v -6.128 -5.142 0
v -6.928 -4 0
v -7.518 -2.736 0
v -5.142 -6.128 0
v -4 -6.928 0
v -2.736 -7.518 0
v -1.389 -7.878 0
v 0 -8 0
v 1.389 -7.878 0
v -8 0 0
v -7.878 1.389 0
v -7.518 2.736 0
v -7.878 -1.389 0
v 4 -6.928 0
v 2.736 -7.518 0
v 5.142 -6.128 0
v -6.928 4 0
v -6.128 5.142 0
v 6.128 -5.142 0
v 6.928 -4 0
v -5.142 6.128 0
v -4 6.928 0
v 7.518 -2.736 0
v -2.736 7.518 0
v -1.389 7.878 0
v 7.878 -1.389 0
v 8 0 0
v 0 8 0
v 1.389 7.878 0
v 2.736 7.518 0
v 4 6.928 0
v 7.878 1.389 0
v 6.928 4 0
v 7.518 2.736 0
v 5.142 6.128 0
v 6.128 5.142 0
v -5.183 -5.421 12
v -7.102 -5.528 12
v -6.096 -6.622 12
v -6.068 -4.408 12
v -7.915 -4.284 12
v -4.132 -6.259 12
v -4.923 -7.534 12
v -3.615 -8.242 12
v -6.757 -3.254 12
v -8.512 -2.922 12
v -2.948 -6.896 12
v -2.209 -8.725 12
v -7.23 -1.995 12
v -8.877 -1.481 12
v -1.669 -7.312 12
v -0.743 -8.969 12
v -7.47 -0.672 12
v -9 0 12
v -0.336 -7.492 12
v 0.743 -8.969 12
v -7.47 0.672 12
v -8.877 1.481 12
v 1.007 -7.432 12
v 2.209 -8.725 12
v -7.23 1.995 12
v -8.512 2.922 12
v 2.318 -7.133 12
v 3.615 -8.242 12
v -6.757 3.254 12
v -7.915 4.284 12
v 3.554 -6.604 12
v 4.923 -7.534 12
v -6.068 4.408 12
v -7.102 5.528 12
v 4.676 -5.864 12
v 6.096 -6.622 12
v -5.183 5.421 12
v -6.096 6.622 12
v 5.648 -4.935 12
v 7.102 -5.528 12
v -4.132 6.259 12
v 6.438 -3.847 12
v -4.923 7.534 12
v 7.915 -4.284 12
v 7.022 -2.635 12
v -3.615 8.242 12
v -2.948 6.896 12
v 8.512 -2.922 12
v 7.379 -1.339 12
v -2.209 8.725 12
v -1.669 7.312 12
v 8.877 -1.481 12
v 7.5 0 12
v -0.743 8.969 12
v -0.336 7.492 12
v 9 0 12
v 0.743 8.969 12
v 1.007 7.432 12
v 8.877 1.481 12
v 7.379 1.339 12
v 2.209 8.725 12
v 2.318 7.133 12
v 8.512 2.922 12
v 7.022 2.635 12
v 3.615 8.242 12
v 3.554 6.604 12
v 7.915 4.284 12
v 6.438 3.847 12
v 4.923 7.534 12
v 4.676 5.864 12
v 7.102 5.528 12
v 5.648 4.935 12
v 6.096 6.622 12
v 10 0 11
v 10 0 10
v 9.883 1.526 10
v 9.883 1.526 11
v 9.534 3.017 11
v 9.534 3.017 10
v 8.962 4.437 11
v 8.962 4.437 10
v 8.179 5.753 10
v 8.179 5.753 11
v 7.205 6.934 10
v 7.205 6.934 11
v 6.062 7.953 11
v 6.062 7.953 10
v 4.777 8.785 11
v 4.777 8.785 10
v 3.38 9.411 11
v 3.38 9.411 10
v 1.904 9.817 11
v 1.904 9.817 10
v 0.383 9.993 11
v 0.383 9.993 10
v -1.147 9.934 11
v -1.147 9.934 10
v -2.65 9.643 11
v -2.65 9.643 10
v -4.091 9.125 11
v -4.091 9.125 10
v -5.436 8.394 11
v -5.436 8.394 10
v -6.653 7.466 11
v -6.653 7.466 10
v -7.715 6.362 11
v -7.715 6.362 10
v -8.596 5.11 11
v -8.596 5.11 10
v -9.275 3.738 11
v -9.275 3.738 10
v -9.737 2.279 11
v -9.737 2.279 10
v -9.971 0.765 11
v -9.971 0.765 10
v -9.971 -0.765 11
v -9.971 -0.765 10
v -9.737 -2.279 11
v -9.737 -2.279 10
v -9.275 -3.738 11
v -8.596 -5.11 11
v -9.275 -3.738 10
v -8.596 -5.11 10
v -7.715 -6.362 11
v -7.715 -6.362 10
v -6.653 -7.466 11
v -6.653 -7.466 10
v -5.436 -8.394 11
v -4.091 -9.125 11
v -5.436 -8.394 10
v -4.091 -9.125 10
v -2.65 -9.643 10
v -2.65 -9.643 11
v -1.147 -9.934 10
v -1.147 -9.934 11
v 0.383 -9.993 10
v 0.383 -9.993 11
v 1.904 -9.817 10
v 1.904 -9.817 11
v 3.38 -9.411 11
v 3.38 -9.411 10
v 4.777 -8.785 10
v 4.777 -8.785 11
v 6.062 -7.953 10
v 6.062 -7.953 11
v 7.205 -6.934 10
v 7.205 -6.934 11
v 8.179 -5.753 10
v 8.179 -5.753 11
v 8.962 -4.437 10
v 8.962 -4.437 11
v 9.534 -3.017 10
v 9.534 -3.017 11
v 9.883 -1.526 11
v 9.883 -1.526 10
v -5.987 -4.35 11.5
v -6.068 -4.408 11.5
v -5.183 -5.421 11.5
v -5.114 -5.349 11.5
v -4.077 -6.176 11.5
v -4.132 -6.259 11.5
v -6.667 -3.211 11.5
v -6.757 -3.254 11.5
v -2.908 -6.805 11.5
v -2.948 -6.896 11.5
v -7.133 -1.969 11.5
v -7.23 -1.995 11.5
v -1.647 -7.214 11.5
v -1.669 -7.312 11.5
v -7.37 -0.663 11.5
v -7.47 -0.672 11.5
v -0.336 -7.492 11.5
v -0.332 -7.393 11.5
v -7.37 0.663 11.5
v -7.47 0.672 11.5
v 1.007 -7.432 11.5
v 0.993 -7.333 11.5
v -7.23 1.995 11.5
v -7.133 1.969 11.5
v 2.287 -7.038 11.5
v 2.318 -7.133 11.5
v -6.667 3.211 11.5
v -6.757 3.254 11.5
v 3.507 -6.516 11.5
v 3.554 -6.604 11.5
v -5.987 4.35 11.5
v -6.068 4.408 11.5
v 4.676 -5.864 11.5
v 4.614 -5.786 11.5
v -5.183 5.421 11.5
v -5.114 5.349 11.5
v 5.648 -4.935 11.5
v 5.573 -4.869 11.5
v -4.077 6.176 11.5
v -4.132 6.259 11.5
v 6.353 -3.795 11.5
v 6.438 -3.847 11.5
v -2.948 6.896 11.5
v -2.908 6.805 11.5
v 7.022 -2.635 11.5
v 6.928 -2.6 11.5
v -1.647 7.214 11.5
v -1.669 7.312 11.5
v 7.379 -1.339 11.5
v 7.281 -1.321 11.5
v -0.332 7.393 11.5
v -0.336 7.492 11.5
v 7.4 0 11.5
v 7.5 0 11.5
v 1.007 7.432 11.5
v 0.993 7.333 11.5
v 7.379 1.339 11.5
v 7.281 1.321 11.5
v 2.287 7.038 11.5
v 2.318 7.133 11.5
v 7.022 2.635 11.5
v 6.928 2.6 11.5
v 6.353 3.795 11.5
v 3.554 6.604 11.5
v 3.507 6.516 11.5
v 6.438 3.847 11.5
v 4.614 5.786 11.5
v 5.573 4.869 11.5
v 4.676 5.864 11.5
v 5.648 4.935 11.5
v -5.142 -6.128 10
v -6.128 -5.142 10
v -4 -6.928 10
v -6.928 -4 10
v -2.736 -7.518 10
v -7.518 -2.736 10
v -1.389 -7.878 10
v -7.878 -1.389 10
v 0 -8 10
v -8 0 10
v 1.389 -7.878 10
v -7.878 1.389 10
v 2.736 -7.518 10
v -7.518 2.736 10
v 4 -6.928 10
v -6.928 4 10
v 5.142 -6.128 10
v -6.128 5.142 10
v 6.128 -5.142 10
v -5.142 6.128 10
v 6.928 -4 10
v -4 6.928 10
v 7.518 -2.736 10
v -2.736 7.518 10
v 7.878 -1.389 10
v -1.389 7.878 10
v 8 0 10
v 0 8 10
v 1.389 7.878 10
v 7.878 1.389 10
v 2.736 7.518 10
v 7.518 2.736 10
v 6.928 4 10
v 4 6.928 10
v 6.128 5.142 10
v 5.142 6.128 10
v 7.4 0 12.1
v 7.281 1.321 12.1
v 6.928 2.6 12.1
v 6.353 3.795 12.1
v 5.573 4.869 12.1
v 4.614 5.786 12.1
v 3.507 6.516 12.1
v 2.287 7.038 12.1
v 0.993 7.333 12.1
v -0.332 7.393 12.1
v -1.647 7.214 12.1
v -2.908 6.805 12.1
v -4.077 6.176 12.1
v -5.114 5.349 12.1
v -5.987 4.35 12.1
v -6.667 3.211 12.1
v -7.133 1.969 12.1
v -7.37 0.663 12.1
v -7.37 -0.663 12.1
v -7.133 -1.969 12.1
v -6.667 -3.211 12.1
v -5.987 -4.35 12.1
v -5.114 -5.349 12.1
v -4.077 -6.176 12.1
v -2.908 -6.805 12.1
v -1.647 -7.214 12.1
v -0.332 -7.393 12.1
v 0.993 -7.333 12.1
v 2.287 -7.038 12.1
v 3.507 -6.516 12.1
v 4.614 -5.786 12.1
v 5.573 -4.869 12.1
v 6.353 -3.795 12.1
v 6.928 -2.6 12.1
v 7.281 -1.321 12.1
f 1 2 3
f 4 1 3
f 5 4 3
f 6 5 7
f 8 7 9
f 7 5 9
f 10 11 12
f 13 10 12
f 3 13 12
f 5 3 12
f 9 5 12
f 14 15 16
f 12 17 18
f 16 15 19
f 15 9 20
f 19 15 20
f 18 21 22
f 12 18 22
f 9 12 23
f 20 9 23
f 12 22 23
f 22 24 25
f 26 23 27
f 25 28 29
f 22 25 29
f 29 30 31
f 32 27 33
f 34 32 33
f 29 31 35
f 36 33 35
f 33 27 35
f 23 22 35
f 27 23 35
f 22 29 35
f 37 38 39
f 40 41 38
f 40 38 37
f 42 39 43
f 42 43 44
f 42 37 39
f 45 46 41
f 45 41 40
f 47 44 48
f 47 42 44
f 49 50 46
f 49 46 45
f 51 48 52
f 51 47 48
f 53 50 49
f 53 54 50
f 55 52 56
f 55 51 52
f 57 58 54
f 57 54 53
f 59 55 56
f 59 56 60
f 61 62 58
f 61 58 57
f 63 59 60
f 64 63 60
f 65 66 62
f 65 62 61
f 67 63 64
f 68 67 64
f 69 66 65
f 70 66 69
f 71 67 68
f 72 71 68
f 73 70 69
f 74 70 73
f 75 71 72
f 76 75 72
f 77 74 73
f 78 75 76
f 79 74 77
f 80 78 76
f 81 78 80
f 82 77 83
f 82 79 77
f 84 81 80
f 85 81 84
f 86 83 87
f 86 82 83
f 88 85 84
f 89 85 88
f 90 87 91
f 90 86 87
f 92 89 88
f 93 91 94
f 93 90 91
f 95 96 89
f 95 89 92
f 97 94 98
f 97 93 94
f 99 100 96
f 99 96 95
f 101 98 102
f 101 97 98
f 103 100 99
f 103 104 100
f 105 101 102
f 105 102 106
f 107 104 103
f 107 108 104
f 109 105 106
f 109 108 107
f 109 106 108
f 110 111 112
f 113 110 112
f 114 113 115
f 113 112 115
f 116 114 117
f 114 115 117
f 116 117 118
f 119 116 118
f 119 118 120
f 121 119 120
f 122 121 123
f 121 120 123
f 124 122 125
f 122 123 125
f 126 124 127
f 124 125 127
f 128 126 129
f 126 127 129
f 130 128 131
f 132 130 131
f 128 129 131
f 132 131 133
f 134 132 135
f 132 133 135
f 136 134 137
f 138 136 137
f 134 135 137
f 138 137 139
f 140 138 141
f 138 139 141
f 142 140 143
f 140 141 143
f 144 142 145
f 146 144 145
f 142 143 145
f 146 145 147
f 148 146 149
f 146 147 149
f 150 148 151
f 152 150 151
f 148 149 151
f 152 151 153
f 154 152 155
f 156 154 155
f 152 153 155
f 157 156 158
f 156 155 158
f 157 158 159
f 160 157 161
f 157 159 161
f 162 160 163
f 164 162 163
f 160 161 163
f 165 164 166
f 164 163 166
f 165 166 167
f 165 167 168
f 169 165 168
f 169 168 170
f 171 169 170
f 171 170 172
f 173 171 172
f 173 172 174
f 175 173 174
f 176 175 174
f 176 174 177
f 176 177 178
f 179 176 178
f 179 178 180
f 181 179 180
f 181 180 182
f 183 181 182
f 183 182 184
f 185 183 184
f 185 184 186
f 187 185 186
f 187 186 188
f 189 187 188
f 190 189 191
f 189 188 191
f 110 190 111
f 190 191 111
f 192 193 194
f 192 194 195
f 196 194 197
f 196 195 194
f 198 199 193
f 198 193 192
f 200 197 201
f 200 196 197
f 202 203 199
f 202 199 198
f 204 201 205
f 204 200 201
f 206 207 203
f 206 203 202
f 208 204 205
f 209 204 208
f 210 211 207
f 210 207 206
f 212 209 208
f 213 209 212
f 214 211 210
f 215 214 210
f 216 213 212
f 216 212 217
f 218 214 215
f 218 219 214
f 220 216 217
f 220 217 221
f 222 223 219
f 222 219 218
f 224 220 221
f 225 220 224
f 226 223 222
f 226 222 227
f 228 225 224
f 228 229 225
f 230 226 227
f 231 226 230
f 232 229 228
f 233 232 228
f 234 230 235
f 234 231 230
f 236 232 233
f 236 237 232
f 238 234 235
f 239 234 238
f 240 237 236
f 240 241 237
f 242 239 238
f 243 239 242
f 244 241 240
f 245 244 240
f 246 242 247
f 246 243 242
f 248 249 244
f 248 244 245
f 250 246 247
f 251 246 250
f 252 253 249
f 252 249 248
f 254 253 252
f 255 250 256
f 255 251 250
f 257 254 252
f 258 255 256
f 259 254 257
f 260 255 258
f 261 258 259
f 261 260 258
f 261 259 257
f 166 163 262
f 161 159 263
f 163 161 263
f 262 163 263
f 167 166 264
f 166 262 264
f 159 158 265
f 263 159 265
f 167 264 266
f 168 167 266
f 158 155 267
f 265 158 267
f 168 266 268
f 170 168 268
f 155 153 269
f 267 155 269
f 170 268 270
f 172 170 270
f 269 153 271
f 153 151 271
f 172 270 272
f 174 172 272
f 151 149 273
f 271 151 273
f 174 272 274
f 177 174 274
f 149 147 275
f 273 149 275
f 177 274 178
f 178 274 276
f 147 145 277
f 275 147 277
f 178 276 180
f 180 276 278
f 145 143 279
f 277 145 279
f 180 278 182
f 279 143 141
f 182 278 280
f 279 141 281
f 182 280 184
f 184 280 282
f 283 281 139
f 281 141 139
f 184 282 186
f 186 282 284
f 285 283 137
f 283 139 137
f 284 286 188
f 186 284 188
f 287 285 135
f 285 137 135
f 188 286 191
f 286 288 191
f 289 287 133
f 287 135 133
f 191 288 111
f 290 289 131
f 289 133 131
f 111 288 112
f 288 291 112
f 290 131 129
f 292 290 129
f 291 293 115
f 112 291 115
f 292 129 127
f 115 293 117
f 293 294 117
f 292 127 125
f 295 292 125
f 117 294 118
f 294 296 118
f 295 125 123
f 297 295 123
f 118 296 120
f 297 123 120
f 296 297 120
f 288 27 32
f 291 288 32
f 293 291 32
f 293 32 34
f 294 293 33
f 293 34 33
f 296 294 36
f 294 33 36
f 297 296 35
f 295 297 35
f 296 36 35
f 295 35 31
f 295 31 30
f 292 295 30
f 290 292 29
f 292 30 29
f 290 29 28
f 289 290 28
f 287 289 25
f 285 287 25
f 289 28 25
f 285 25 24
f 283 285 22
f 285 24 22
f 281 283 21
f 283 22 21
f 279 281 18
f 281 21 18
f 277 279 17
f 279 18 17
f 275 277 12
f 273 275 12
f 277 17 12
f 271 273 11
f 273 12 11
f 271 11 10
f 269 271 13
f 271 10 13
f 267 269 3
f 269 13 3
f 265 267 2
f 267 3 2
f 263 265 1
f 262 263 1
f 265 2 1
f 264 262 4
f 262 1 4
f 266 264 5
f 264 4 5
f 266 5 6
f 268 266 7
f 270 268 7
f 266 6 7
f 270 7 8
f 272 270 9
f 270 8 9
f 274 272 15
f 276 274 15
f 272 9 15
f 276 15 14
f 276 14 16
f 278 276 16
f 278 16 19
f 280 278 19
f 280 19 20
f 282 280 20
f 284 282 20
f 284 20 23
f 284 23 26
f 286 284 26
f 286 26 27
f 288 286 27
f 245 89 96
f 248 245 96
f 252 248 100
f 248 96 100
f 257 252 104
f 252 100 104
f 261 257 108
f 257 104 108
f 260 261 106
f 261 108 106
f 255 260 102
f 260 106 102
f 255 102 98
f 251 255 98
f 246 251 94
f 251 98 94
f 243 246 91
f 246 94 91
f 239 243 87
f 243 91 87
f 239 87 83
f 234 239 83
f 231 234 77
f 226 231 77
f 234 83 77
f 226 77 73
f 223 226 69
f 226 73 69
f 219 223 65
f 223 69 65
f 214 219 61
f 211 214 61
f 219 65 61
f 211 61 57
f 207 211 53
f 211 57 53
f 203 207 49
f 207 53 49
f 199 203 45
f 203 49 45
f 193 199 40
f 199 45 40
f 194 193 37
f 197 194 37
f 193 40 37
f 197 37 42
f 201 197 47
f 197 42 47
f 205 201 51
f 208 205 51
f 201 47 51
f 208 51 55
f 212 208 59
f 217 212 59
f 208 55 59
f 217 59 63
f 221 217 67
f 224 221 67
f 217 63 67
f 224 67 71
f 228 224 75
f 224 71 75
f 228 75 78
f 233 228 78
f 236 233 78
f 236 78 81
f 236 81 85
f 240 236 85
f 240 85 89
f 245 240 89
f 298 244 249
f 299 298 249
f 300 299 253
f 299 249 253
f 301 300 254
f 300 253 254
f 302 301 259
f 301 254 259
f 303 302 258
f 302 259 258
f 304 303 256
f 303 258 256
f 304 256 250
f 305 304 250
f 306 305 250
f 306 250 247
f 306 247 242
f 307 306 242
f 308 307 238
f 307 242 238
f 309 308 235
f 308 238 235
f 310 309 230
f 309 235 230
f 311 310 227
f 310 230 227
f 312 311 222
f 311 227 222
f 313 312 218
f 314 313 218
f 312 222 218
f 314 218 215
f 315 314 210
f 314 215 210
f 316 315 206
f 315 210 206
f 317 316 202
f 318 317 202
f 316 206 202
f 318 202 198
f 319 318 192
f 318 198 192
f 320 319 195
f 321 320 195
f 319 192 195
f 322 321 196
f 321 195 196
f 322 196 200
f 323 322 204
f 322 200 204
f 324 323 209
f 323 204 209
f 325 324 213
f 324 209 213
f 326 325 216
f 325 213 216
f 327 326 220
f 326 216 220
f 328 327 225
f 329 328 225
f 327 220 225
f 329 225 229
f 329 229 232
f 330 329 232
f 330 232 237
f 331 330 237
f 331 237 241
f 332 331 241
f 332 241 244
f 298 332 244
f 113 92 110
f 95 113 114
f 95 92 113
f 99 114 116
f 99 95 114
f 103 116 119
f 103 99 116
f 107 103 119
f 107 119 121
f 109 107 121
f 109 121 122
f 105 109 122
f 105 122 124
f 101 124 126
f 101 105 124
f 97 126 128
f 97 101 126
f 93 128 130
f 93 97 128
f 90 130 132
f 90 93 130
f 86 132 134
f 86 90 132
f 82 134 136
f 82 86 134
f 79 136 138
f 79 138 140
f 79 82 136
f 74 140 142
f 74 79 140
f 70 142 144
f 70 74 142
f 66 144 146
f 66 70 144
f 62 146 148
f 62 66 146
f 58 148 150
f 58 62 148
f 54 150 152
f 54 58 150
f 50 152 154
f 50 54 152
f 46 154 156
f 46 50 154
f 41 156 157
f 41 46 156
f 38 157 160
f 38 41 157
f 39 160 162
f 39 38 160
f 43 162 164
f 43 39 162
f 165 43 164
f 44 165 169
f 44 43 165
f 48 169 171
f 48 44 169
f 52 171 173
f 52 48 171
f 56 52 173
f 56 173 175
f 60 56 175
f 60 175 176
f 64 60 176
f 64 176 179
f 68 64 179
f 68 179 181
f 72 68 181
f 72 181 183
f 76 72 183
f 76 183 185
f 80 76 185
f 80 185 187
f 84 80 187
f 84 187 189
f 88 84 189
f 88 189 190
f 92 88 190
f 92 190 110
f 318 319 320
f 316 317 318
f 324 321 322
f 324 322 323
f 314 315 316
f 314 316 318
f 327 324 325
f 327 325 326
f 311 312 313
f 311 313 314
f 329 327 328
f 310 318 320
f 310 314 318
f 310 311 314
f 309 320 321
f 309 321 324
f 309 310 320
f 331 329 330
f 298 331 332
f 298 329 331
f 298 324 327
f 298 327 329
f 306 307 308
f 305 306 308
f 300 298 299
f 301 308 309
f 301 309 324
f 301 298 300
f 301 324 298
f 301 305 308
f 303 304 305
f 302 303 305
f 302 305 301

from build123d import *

# Parameters (mm, degrees)
ESQUISSE1_R             = 8
BOSS_EXTRU_1_DEPTH      = 10
ESQUISSE2_R             = 10
BOSS_EXTRU_2_DEPTH      = 2
CHANFREIN1_SIZE         = 1
ESQUISSE3_R             = 7.5
ENL_V_MAT_EXTRU_1_DEPTH = 0.5
ESQUISSE4_R             = 7.4
BOSS_EXTRU_3_DEPTH      = 0.6


with BuildPart() as part:
    # Esquisse1 → Boss.-Extru.1 (new body)
    with BuildSketch(Plane.XY):
        Circle(ESQUISSE1_R)
    extrude(amount=BOSS_EXTRU_1_DEPTH)

    # Esquisse2 → Boss.-Extru.2 (add)
    with BuildSketch(Plane.XY.offset(10)):
        Circle(ESQUISSE2_R)
    extrude(amount=BOSS_EXTRU_2_DEPTH)

    # Chanfrein1
    chanfrein1_edges = [part.edges().sort_by_distance(p)[0] for p in [
        (-10, 0, 12),
    ]]
    chamfer(chanfrein1_edges, length=CHANFREIN1_SIZE)

    # Esquisse3 → Enlèv. mat.-Extru.1 (cut)
    with BuildSketch(Plane.XY.offset(12)):
        Circle(ESQUISSE3_R)
    extrude(amount=-ENL_V_MAT_EXTRU_1_DEPTH, mode=Mode.SUBTRACT)

    # Esquisse4 → Boss.-Extru.3 (add)
    with BuildSketch(Plane.XY.offset(11.5)):
        Circle(ESQUISSE4_R)
    extrude(amount=BOSS_EXTRU_3_DEPTH)


solid = part.part
